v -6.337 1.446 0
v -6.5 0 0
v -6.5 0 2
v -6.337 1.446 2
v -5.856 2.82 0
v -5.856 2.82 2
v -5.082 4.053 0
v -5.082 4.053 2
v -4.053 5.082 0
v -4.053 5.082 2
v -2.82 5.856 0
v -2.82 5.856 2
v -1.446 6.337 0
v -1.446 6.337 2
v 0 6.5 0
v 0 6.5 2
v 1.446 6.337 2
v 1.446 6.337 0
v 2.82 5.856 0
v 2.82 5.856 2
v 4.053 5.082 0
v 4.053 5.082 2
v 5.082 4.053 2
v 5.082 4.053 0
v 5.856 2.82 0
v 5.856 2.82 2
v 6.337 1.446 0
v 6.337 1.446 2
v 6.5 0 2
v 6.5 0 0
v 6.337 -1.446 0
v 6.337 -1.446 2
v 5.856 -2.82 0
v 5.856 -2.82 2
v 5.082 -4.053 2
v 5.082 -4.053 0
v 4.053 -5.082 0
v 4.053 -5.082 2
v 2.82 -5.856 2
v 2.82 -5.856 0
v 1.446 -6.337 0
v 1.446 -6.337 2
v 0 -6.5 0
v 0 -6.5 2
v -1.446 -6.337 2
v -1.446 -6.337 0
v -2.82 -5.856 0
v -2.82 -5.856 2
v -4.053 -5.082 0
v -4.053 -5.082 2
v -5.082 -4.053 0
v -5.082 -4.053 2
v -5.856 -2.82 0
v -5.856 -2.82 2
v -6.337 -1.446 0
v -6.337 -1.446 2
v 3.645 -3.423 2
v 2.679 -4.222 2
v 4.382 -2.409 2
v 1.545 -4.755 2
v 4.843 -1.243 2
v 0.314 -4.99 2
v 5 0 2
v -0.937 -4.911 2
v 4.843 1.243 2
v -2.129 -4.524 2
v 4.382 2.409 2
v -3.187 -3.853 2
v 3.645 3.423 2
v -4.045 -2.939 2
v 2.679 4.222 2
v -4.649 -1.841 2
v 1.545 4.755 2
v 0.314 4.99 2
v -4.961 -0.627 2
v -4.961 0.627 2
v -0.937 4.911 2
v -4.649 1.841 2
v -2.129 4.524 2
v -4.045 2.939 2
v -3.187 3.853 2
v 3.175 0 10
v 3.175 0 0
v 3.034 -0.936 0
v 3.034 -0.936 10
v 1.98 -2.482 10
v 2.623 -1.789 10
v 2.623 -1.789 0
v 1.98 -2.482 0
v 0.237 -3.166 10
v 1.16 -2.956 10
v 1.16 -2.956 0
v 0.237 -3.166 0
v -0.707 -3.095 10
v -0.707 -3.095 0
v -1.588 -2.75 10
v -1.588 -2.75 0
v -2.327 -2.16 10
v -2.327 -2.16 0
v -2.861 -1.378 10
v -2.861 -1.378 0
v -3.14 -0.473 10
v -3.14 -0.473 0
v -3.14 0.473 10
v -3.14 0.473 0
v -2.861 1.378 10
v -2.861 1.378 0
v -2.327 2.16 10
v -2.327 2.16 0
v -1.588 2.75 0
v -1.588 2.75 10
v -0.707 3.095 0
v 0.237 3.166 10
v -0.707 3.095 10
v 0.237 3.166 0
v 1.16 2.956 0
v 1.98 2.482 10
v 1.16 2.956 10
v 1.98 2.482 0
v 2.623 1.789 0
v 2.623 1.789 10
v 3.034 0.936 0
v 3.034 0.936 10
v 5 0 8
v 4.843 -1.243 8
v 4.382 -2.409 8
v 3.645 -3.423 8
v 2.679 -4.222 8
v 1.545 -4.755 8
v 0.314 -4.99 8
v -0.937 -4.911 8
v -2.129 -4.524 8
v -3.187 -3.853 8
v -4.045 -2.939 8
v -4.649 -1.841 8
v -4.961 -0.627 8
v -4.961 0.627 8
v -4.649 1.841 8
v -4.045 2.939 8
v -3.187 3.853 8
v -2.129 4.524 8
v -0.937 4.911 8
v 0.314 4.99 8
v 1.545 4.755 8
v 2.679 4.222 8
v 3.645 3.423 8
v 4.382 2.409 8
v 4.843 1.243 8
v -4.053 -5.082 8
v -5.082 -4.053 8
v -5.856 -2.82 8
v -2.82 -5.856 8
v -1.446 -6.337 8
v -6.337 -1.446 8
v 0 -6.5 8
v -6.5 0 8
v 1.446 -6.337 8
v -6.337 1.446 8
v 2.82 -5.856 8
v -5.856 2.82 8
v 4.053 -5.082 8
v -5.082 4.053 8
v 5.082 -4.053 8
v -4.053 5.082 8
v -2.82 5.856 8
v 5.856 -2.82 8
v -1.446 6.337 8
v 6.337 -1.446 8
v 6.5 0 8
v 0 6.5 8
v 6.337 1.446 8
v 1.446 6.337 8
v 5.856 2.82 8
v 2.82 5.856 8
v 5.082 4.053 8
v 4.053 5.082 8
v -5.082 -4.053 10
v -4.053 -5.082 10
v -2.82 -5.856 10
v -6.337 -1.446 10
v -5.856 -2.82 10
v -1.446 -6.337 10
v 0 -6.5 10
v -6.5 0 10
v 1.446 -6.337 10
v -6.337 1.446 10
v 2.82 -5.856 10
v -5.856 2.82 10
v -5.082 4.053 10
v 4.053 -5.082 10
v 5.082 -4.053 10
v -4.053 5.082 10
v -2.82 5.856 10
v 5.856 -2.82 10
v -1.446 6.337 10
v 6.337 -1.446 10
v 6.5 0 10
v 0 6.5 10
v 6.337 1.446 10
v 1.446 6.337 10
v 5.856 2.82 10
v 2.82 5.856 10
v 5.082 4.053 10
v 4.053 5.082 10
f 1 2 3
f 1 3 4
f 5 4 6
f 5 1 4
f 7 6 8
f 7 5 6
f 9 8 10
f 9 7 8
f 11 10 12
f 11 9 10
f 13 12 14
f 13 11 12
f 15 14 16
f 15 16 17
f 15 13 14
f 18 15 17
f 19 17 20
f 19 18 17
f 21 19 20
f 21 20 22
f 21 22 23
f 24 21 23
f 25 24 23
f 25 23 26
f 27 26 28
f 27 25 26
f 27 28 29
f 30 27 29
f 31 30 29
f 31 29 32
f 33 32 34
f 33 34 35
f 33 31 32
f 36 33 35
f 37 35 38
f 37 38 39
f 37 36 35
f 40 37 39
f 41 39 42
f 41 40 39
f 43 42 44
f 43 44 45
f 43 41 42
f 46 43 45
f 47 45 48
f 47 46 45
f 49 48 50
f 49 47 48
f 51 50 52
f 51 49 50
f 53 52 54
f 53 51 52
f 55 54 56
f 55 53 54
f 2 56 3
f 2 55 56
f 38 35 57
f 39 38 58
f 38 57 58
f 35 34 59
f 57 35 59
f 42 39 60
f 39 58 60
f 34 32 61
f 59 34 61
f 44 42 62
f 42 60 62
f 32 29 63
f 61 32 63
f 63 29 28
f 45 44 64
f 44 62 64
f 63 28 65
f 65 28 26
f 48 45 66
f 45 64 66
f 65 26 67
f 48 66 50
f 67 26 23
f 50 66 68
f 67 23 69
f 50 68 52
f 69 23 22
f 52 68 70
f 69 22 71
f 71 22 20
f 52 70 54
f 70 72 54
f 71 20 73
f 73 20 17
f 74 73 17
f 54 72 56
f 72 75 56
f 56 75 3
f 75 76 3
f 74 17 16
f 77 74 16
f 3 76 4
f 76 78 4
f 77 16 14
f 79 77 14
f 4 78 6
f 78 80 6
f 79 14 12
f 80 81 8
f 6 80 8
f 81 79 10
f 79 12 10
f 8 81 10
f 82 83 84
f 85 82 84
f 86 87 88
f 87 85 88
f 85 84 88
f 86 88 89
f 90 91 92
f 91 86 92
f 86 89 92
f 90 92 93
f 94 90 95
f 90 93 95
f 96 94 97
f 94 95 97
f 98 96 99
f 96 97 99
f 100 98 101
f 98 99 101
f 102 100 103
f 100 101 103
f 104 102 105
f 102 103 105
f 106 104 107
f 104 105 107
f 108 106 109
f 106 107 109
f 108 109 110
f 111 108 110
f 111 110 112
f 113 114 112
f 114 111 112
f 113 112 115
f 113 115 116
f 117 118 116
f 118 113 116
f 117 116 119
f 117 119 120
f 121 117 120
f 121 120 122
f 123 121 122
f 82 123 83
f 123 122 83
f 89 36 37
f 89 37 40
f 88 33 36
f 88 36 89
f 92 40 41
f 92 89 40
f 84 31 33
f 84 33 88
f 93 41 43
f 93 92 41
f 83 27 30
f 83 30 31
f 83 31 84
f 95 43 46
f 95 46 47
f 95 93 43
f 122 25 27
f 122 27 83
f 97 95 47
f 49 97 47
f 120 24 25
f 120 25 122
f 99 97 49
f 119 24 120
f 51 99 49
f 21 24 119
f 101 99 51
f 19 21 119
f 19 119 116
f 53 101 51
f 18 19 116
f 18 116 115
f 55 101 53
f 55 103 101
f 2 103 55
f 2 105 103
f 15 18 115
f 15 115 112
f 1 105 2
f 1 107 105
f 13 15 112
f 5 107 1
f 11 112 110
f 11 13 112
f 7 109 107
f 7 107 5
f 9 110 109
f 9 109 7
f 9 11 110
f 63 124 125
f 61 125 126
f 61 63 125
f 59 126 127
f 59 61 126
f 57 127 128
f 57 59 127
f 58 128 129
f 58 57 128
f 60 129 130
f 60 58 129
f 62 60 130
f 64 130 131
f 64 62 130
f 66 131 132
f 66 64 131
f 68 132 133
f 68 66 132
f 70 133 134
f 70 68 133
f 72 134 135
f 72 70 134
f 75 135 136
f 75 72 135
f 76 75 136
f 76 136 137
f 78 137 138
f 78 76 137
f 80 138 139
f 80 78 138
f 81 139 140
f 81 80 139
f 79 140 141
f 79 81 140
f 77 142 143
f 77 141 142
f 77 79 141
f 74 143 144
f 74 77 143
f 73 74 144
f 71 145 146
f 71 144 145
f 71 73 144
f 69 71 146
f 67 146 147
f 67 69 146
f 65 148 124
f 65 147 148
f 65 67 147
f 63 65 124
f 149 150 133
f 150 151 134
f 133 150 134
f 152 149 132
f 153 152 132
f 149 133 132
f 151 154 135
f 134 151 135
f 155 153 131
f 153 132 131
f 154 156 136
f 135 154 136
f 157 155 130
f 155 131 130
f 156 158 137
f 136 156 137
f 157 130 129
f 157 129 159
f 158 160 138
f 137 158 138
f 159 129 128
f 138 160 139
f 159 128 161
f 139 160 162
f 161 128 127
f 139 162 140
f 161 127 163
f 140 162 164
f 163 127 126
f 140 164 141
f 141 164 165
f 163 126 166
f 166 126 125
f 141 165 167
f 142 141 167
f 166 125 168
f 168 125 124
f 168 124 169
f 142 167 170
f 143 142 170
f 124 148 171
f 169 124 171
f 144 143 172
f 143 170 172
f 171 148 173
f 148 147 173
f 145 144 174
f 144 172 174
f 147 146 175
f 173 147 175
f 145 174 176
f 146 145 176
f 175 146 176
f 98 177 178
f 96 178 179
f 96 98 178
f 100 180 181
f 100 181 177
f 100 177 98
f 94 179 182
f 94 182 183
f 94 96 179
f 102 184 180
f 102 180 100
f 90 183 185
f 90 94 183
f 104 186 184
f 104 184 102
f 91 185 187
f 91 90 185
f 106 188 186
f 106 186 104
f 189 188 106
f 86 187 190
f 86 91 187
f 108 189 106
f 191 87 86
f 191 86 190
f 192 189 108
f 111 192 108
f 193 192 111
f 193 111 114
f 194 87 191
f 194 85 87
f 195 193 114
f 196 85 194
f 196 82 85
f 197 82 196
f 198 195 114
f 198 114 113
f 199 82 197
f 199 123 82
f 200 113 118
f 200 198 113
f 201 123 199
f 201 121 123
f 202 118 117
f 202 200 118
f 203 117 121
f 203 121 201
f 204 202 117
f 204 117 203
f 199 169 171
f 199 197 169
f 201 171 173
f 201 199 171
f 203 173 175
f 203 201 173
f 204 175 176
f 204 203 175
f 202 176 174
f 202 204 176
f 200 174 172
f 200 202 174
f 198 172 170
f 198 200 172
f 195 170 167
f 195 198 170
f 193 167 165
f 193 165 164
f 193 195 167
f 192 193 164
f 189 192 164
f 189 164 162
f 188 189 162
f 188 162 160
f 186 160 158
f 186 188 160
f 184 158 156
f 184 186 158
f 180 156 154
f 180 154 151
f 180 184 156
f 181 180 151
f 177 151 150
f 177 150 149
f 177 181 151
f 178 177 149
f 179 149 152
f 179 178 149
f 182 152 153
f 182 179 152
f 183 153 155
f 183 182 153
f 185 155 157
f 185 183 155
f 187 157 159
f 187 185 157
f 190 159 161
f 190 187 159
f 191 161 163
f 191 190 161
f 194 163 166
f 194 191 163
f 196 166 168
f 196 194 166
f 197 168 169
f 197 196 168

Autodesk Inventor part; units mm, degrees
ref_plane "YZ Plane" through (0, 0, 0) normal (1, 0, 0) x (0, 1, 0)
ref_plane "XZ Plane" through (0, 0, 0) normal (0, 1, 0) x (-1, 0, 0)
ref_plane "XY Plane" through (0, 0, 0) normal (0, 0, 1) x (1, 0, 0)
sketch "Sketch1" plane through (0, 0, 0) normal (0, 0, 1) x (1, 0, 0)
  circle A0 centre (0, 0) radius 5
  circle A1 centre (0, 0) radius 3.175
  dimension "d0" = 10
  dimension "d1" = 6.35
extrude "Extrusion1" add sketch "Sketch1" along normal blind 10
sketch "Sketch2" plane through (0, 0, 10) normal (0, 0, 1) x (1, 0, 0)
  circle A0 centre (0, 0) radius 5 projected
  circle A1 centre (0, 0) radius 6.5
  dimension "d4" = 13
sketch "Sketch4" plane through (0, 0, 0) normal (0, 0, -1) x (-1, 0, 0)
  circle A0 centre (0, 0) radius 6.5
  circle A1 centre (0, 0) radius 5 projected
  dimension "d8" = 13
extrude "Extrusion2" add sketch "Sketch2" against normal blind 2
extrude "Extrusion3" add sketch "Sketch4" against normal blind 2
equation "\"d11\" = d9"
equation "\"d9\" = 2"
properties part number "spindle"
